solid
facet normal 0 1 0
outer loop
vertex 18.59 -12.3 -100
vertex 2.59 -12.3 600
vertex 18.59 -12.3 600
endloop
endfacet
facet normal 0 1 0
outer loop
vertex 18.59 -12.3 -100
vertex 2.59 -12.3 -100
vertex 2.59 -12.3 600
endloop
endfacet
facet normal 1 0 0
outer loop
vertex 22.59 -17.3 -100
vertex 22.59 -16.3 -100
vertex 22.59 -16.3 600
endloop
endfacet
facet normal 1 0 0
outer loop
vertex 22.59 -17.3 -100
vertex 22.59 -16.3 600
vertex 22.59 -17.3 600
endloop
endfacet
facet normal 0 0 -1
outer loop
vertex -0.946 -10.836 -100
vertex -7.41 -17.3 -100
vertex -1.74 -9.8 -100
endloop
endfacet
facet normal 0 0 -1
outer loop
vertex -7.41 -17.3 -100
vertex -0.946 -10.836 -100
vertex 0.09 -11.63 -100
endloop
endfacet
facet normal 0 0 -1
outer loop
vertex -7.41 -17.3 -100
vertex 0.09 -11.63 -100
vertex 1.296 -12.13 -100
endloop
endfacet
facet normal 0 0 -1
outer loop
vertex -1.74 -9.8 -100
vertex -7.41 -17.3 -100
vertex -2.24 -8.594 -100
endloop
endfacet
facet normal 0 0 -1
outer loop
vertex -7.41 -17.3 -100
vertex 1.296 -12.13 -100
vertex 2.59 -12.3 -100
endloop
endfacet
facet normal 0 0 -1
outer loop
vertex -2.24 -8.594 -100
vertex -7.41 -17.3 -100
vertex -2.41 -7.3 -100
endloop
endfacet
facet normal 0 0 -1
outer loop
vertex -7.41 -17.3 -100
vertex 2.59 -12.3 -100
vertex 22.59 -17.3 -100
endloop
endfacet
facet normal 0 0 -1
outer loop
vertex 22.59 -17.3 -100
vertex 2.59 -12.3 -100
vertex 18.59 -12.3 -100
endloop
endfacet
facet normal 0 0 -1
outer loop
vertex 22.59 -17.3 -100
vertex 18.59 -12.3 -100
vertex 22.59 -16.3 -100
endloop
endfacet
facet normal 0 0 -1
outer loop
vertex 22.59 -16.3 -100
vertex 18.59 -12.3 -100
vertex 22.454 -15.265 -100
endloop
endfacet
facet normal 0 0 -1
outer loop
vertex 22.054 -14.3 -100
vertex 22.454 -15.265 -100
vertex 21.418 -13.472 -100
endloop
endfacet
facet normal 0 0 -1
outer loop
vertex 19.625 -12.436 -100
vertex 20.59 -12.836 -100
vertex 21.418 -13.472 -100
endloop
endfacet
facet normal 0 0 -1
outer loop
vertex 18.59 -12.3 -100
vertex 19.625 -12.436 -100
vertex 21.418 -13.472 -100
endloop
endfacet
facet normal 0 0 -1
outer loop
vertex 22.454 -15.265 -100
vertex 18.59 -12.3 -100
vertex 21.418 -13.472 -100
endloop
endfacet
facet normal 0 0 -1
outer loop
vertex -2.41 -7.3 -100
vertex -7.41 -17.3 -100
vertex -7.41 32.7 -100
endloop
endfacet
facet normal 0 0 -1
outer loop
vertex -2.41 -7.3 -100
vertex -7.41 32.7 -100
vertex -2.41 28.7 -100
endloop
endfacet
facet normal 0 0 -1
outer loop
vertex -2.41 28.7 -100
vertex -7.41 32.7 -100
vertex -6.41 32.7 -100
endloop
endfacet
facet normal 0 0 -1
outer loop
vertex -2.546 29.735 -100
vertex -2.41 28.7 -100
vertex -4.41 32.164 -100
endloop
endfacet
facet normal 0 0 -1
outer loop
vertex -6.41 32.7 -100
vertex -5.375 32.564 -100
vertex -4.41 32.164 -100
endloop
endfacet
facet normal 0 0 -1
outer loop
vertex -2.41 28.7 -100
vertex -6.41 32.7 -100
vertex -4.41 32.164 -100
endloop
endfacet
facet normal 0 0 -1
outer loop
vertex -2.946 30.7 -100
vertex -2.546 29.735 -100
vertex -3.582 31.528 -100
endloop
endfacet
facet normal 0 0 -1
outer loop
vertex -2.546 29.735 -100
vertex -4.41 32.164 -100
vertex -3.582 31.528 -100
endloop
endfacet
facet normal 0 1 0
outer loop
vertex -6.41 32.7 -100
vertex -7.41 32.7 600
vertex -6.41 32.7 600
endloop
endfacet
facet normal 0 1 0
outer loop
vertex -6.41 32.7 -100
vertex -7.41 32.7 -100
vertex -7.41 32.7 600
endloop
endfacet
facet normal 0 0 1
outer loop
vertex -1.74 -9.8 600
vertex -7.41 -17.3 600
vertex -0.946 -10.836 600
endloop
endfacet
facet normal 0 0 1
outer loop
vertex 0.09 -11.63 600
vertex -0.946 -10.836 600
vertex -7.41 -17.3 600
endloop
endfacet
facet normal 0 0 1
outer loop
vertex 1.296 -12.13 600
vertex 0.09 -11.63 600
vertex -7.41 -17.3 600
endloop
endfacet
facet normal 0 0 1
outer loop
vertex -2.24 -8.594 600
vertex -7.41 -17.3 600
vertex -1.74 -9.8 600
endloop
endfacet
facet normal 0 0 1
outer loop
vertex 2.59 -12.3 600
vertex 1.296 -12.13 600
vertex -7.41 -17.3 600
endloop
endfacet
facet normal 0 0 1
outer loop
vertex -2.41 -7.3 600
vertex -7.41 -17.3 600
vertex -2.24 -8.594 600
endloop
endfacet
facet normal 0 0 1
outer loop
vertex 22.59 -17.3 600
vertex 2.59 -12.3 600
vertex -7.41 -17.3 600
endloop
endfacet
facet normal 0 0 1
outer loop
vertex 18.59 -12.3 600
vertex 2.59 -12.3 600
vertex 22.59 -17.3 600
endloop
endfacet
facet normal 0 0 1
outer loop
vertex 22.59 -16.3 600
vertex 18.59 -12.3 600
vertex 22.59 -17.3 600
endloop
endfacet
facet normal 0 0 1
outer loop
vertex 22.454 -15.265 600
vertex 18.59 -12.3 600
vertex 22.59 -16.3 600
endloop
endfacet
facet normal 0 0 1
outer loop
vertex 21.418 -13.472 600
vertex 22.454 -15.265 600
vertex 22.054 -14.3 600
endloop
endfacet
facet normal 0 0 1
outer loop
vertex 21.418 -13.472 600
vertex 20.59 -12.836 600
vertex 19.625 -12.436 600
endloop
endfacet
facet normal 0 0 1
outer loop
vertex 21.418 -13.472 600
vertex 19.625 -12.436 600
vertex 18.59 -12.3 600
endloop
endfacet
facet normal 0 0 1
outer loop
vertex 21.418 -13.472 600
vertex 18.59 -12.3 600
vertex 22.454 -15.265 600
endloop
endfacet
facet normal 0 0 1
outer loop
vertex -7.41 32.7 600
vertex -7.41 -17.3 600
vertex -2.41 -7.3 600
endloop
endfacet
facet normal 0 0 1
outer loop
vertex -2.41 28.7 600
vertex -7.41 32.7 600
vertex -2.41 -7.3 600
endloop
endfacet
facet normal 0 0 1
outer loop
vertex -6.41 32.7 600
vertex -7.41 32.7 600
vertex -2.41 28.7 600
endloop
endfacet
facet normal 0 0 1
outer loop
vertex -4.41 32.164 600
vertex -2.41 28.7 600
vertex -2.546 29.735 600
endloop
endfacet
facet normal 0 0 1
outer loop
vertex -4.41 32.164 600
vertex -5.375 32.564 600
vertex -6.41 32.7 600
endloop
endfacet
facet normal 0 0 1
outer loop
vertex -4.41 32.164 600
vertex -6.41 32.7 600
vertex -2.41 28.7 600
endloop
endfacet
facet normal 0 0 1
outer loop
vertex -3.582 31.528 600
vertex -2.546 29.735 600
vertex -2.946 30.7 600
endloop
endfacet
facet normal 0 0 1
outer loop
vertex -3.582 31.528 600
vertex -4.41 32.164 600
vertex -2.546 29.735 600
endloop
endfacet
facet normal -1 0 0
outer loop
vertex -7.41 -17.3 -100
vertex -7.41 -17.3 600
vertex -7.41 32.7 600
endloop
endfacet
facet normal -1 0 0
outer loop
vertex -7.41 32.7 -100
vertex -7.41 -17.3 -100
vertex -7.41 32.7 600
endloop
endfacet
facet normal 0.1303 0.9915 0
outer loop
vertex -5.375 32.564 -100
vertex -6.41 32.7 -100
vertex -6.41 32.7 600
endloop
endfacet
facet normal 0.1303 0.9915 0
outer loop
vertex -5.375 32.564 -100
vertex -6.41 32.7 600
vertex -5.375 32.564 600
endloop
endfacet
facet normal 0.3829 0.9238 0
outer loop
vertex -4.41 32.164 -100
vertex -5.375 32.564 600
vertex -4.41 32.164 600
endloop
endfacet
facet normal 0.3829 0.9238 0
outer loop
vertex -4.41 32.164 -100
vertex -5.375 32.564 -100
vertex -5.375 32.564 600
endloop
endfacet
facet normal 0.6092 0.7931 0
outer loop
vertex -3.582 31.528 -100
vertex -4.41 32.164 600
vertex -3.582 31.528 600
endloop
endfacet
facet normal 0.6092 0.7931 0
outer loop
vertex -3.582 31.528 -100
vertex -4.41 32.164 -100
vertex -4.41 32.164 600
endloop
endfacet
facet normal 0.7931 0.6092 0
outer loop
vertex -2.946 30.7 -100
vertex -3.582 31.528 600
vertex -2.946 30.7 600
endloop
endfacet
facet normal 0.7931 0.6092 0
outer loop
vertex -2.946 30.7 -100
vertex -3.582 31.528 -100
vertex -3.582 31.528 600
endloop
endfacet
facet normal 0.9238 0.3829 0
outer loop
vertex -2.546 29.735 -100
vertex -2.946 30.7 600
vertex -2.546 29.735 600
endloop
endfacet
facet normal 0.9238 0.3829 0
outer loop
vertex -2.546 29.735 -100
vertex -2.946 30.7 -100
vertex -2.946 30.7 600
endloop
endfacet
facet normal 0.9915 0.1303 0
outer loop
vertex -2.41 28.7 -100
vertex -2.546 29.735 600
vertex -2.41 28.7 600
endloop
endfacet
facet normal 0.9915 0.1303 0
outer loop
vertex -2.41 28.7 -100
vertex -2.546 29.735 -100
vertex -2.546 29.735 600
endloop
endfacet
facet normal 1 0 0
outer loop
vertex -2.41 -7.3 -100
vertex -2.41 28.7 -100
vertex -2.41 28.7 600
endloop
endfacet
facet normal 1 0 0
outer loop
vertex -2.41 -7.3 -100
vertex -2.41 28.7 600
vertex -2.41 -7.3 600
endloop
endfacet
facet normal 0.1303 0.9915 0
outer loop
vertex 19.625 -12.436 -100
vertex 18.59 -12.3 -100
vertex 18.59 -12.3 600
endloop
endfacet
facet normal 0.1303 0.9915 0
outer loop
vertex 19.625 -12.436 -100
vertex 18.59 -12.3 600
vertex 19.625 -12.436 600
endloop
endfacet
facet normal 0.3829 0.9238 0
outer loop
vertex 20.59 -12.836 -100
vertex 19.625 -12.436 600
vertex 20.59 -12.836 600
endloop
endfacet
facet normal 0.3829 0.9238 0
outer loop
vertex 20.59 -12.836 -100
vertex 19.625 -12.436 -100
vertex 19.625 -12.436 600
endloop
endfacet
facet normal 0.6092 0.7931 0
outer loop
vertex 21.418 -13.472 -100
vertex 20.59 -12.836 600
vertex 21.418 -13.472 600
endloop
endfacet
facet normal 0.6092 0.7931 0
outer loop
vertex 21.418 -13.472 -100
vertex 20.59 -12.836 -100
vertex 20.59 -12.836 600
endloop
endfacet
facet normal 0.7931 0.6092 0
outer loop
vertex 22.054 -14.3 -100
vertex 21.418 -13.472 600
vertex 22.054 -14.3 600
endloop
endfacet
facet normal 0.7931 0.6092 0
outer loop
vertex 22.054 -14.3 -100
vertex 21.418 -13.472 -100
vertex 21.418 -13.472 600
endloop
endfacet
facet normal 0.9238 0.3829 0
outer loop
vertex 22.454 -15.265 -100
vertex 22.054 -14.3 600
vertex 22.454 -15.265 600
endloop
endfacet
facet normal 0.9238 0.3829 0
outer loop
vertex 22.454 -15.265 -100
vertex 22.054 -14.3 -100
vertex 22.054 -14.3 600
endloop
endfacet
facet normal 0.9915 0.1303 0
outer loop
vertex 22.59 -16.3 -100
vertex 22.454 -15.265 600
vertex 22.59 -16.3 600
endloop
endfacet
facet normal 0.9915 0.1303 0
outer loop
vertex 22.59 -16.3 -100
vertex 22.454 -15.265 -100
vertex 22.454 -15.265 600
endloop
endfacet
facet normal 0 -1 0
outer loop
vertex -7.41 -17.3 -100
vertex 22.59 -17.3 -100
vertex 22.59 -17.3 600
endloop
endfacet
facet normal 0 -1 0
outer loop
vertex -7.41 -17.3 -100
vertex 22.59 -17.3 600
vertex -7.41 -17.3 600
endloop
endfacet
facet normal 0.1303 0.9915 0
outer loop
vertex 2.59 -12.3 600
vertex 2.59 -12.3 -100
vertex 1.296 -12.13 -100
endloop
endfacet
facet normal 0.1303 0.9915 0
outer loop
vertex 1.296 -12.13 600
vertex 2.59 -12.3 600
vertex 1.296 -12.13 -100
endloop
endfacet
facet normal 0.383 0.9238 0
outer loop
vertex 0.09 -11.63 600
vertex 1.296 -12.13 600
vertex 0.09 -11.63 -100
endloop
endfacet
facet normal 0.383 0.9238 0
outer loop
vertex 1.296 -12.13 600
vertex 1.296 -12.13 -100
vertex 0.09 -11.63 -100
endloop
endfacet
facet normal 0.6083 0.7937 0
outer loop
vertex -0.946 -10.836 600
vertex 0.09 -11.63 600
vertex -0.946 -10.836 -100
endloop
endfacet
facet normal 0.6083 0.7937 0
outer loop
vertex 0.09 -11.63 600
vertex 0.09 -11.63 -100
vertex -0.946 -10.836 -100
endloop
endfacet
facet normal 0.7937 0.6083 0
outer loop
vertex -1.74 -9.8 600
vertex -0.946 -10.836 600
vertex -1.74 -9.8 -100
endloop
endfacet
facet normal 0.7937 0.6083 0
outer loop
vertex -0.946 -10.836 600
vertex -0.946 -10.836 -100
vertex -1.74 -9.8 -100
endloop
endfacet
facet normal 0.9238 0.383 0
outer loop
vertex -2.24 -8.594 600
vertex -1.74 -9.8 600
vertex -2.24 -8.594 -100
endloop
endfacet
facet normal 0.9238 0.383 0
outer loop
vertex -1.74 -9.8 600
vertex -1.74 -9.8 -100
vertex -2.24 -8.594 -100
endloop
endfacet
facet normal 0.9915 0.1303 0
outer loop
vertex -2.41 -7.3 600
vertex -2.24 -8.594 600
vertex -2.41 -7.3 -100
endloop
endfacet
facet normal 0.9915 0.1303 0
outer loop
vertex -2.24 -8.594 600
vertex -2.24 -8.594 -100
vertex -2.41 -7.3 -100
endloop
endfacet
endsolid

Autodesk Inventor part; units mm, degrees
ref_plane "YZ Plane" through (0, 0, 0) normal (1, 0, 0) x (0, 1, 0)
ref_plane "Start Plane" through (0, 0, -100) normal (0, 0, 1) x (1, 0, 0)
ref_plane "End Plane" through (0, 0, 600) normal (0, 0, 1) x (1, 0, 0)
sketch "Sketch" plane through (0, 0, 0) normal (0, 0, 1) x (1, 0, 0)
  line L0 (-2.41, 28.7) -> (-2.41, -7.3)
  line L1 (-7.41, 32.7) -> (-6.41, 32.7)
  line L2 (-7.41, -17.3) -> (-7.41, 32.7)
  line L3 (22.59, -17.3) -> (-7.41, -17.3)
  line L4 (22.59, -16.3) -> (22.59, -17.3)
  line L5 (2.59, -12.3) -> (18.59, -12.3)
  arc A0 (-2.41, -7.3) -> (2.59, -12.3) centre (2.59, -7.3) ccw
  arc A1 (-2.41, 28.7) -> (-6.41, 32.7) centre (-6.41, 28.7) ccw
  arc A2 (22.59, -16.3) -> (18.59, -12.3) centre (18.59, -16.3) ccw
  line L6 (0, 43.6941) -> (0, -27.4657) construction
  line L7 (-13.5757, 0) -> (29.5841, 0) construction
  point P0 (-2.41, 32.7)
  point P1 (-2.41, -12.3)
  point P2 (22.59, -12.3)
  dimension "d4" = 30
  dimension "d6" = 50
  dimension "d8" = 5
  dimension "d10" = 5
  dimension "d17" = 5
  dimension "d18" = 4
  dimension "d19" = 17.3
  dimension "d20" = 7.41
extrude "Body" add sketch "Sketch" along normal up to surface (700 mm away) from surface at -100
sketch "Sketch3" plane through (0, 0, 0) normal (0, 0, 1) x (1, 0, 0)
  line L0 (0, 0) -> (10, 0)
ref_plane "Work Plane10" through (0, 0, 0) normal (0, -1, 0) x (1, 0, 0)
sketch "Sketch4" plane through (0, 0, 0) normal (0, -1, 0) x (1, 0, 0)
  line L0 (-2, -100) -> (12, -100)
  line L1 (-2, 600) -> (12, 600)
  dimension "d24" = 700
equation "\"d4\" = b"
equation "\"d6\" = ParH"
equation "\"d8\" = ParT"
equation "\"d10\" = ParT"
equation "\"d17\" = R"
equation "\"d18\" = R1"
equation "\"d19\" = ex"
equation "\"d20\" = ey"
equation "\"d11\" = G_L"
equation "\"b\" = 30"
equation "\"ParT\" = 5"
equation "\"R1\" = 4"
equation "\"G_L\" = d24"
equation "\"ParH\" = 50"
equation "\"R\" = 5"
equation "\"ey\" = 7.41"
equation "\"ex\" = 17.3"
equation "\"G_OFFSET_END\" = 0"
properties part number "ISO 657-2 - 50x 30x 5-700" material "Steel, Mild"
